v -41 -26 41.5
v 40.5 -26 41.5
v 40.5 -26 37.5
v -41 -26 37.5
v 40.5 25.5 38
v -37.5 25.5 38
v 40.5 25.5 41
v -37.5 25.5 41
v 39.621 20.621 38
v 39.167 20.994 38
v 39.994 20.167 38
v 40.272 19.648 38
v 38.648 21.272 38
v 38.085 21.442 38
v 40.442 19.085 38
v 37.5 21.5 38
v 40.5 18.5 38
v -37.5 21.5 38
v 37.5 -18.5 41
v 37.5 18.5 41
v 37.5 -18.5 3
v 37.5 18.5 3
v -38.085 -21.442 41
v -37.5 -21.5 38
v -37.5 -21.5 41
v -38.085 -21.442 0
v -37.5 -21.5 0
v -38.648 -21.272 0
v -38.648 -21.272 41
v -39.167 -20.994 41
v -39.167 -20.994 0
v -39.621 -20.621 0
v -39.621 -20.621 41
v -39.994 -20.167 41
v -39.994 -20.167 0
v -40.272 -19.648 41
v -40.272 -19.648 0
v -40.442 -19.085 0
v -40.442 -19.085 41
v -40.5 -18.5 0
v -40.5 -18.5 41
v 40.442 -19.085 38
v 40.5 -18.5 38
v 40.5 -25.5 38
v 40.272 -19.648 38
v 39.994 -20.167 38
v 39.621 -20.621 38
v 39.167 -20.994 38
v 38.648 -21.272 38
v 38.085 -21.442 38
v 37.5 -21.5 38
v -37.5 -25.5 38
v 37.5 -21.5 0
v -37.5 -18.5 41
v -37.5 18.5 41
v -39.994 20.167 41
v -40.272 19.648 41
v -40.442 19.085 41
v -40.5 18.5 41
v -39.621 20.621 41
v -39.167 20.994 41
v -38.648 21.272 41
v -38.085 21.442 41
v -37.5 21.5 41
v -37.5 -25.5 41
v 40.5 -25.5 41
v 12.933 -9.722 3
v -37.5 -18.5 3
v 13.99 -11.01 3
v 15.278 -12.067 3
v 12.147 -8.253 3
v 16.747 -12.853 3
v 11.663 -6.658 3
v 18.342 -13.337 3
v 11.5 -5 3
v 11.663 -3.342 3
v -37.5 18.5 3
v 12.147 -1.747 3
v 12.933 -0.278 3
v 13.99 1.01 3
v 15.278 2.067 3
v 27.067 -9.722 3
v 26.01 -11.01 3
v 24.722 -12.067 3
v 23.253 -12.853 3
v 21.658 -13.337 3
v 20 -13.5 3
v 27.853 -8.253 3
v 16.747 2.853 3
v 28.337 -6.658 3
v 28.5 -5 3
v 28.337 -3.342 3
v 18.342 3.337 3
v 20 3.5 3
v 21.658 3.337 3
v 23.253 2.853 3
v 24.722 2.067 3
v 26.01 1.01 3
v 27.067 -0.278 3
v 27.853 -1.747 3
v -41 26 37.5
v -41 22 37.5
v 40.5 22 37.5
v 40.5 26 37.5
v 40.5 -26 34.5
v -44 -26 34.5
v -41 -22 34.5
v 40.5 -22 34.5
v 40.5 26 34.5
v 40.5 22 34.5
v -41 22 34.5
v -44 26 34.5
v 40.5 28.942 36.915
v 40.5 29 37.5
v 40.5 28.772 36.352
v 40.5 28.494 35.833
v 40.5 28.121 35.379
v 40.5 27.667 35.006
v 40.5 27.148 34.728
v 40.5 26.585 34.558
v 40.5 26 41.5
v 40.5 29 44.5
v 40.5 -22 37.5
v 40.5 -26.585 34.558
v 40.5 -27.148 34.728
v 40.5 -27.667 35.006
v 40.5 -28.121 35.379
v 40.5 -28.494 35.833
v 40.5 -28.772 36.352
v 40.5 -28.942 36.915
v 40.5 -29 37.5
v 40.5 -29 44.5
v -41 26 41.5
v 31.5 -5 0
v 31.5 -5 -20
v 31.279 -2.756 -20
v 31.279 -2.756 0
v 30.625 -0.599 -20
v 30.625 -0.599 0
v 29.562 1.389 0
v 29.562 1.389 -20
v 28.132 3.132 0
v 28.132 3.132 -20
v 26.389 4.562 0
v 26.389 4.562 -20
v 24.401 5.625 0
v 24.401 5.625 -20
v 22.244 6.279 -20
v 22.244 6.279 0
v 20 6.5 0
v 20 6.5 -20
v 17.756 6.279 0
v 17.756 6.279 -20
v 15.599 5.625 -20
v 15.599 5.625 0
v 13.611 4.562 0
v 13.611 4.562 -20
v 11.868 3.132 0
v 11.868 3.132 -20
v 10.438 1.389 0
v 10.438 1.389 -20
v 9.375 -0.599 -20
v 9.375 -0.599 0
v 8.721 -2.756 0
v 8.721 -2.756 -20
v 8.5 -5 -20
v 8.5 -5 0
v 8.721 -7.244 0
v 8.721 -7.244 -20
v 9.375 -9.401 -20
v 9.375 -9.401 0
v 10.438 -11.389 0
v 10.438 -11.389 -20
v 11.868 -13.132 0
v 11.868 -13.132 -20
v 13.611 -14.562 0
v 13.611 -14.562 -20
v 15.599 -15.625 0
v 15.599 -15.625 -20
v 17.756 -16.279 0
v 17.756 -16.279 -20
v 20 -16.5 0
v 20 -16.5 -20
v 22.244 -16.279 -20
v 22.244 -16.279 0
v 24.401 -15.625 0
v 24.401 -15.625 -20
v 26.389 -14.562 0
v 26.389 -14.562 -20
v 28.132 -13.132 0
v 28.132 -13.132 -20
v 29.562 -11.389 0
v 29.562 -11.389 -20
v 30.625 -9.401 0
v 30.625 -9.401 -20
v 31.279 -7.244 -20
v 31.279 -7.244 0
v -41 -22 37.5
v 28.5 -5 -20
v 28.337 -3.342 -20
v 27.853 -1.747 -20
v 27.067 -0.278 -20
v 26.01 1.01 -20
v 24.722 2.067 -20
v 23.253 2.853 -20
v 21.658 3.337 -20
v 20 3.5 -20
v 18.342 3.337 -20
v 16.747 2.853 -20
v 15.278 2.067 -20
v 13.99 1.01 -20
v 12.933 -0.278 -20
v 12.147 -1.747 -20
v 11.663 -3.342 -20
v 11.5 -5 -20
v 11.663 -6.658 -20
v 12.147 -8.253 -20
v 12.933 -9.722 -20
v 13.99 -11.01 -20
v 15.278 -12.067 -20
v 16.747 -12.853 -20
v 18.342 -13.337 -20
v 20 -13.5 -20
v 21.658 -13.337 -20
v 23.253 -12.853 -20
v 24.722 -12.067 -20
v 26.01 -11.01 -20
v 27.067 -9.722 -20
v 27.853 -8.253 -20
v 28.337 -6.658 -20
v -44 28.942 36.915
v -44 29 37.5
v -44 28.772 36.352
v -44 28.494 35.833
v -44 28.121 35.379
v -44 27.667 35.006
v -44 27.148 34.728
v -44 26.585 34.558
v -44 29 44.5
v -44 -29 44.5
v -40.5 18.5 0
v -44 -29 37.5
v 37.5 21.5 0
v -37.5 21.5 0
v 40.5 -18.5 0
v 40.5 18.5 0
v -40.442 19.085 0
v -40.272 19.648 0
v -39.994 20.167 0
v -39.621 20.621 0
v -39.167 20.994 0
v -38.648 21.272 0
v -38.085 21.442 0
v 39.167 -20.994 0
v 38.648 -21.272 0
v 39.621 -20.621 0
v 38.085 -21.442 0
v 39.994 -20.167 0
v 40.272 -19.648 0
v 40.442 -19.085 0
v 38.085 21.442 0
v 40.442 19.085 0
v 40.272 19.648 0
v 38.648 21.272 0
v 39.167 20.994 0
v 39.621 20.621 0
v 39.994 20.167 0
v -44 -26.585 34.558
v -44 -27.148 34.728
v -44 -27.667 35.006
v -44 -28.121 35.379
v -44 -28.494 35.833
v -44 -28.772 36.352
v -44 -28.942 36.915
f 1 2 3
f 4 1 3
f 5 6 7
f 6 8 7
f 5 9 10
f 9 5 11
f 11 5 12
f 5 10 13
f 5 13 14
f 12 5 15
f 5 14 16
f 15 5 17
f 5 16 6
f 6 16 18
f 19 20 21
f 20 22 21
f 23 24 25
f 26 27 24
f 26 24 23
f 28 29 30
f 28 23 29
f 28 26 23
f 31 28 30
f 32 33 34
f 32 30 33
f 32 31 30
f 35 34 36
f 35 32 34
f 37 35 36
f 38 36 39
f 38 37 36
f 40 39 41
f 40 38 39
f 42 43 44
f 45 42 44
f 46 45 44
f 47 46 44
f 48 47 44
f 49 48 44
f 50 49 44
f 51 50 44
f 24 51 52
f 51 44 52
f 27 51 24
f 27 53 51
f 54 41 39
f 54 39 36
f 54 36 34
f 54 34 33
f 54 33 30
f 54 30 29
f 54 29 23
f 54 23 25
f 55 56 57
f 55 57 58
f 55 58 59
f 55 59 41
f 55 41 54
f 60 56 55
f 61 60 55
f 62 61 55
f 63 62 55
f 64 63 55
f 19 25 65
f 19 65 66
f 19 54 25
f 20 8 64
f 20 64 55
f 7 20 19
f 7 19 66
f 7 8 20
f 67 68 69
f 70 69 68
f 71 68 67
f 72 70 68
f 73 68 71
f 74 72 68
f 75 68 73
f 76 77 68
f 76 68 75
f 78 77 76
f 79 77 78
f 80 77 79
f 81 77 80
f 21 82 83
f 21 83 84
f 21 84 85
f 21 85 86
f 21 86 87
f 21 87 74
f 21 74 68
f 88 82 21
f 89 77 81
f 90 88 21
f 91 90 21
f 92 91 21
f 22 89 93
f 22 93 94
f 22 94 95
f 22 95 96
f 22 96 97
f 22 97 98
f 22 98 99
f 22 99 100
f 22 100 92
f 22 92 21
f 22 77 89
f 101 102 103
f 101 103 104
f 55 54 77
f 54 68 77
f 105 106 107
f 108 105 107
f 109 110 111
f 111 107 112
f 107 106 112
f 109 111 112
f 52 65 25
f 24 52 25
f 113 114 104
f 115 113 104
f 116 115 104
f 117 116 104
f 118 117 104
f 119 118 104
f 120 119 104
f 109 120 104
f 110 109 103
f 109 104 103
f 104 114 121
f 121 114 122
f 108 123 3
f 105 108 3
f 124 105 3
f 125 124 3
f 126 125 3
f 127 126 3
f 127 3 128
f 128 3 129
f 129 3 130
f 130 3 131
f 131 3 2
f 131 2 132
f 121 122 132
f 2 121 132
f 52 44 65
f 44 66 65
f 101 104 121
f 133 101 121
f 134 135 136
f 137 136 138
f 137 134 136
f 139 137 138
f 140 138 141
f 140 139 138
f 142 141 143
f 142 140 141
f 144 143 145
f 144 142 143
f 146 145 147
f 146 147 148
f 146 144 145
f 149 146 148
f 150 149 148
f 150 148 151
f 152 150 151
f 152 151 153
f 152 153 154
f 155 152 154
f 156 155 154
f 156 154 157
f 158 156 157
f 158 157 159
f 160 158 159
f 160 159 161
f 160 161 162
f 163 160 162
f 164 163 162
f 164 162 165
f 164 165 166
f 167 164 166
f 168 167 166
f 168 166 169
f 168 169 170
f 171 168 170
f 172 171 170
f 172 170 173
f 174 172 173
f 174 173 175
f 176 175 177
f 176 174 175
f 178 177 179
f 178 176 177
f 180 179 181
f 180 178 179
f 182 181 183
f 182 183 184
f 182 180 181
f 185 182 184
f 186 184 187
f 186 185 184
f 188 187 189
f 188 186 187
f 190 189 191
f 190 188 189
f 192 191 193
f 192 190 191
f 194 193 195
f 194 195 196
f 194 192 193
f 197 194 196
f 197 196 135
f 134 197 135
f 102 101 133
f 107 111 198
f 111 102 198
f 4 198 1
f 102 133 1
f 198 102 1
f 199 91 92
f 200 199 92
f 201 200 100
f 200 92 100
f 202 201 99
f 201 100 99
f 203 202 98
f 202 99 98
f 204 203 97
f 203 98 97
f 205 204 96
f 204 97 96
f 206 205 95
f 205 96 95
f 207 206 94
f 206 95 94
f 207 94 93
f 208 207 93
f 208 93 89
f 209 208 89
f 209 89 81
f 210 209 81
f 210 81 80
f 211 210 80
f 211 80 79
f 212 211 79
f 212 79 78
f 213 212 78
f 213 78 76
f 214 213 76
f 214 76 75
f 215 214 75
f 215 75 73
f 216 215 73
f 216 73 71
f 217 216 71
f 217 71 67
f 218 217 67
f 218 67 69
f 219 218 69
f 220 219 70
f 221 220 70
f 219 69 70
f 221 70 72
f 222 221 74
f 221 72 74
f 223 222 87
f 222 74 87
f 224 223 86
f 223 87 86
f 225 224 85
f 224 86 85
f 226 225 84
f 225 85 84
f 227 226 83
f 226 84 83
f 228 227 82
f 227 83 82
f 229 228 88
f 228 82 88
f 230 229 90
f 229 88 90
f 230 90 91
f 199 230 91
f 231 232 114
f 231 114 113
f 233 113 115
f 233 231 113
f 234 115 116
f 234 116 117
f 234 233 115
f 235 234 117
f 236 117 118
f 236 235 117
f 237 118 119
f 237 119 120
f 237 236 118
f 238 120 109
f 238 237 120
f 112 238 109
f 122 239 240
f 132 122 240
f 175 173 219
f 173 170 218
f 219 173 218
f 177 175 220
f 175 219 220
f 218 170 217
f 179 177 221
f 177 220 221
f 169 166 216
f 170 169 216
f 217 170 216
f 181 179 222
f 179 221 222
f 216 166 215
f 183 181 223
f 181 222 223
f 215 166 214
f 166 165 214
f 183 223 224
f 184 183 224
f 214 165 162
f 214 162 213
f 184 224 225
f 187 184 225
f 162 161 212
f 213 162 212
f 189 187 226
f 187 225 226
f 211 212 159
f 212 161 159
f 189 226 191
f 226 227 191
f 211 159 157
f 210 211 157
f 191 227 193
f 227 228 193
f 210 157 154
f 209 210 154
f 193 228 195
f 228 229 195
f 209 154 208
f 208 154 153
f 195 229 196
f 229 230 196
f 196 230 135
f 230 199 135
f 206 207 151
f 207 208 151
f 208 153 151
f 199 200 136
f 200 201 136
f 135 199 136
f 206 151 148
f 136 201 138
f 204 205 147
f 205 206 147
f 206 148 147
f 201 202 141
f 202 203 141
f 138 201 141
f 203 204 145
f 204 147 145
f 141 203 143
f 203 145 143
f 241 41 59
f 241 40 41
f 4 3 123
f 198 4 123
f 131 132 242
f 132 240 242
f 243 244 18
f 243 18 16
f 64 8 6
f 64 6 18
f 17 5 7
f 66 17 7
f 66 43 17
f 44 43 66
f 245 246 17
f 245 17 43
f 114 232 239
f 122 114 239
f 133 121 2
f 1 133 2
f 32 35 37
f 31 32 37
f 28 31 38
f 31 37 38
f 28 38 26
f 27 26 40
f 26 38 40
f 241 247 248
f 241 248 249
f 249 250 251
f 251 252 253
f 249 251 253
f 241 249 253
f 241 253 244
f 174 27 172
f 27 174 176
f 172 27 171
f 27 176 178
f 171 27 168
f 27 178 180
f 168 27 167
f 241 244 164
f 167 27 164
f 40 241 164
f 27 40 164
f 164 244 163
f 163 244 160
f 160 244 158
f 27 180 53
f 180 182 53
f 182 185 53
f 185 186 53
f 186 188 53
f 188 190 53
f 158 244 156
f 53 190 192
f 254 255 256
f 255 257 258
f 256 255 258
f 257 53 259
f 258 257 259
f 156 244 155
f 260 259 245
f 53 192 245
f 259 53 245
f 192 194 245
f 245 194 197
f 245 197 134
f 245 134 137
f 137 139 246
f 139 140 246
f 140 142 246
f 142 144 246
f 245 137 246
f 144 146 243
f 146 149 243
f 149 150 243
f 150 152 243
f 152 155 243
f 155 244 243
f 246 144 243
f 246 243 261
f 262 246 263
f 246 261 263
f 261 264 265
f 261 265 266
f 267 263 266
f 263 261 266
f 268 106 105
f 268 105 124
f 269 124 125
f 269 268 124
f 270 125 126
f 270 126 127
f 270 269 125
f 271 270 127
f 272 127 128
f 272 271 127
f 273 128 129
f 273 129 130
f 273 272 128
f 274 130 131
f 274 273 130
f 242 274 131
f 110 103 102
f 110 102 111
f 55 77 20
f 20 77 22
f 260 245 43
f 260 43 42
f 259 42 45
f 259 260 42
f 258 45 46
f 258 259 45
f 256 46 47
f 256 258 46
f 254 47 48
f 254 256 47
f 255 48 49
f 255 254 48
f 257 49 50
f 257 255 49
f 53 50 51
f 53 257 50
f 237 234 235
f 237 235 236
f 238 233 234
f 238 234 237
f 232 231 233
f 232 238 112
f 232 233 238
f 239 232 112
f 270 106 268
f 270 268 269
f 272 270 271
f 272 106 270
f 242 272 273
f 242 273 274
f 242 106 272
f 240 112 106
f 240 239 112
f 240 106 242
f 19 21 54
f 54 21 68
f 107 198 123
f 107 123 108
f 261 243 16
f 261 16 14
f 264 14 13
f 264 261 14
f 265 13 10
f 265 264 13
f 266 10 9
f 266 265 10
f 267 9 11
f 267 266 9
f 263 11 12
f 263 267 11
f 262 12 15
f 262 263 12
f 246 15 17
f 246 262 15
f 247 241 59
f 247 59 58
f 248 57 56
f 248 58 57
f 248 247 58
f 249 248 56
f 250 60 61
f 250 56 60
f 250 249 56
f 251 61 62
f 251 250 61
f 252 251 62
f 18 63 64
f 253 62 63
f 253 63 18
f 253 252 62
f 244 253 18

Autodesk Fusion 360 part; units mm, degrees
sketch "Sketch1" plane through (0, 0, 0) normal (0, 0, 1) x (1, 0, 0)
  line L0 (37.5, -18.5) -> (-37.5, -18.5)
  line L1 (-37.5, -18.5) -> (-37.5, 18.5)
  line L2 (-37.5, 18.5) -> (37.5, 18.5)
  line L3 (37.5, 18.5) -> (37.5, -18.5)
  line L4 (37.5, -18.5) -> (-37.5, 18.5) construction
  line L5 (-37.5, -18.5) -> (37.5, 18.5) construction
  line L6 (-37.5, 21.5) -> (37.5, 21.5)
  line L7 (40.5, 18.5) -> (40.5, -18.5)
  line L8 (37.5, -21.5) -> (-37.5, -21.5)
  line L9 (-40.5, -18.5) -> (-40.5, 18.5)
  arc A0 (-37.5, 21.5) -> (-40.5, 18.5) centre (-37.5, 18.5) ccw
  arc A1 (40.5, 18.5) -> (37.5, 21.5) centre (37.5, 18.5) ccw
  arc A2 (37.5, -21.5) -> (40.5, -18.5) centre (37.5, -18.5) ccw
  arc A3 (-40.5, -18.5) -> (-37.5, -21.5) centre (-37.5, -18.5) ccw
  circle A4 centre (20, -5) radius 8.5
  circle A5 centre (20, -5) radius 11.5
  dimension "d1" = 75
  dimension "d2" = 37
  dimension "d4" = 3
  dimension "d5" = 3
  dimension "d6" = 3
  dimension "d7" = 3
  dimension "d10" = 17
  dimension "d11" = 23
extrude "Extrude2" add sketch "Sketch1" against normal blind 20 contours A5 makes body 1
extrude "Extrude1" add sketch "Sketch1" along normal blind 3 separate body contours L0 L1 L2 L3 | L6 L7 L8 L9 A0 A1 A2 A3 | A4 | A5 makes body 2
extrude "Extrude3" cut sketch "Sketch1" along normal blind 11 contours A4 bodies 2
extrude "Extrude4" add sketch "Sketch1" along normal blind 41 contours L6 L7 L8 L9 A0 A1 A2 A3 bodies 2
sketch "Sketch2" plane through (0, 0, 41) normal (0, 0, 1) x (-1, 0, 0)
  line L0 (37.5, -18.5) -> (-37.5, -18.5)
  line L1 (-37.5, -18.5) -> (-37.5, 18.5)
  line L2 (-37.5, 18.5) -> (37.5, 18.5)
  line L3 (37.5, 18.5) -> (37.5, -18.5)
  arc A0 (37.5, -21.5) -> (40.5, -18.5) centre (37.5, -18.5) ccw
  line L4 (40.5, -18.5) -> (40.5, 18.5)
  arc A1 (40.5, 18.5) -> (37.5, 21.5) centre (37.5, 18.5) ccw
  line L5 (37.5, 21.5) -> (-37.5, 21.5)
  arc A2 (-37.5, 21.5) -> (-40.5, 18.5) centre (-37.5, 18.5) ccw
  line L6 (-40.5, 18.5) -> (-40.5, -18.5)
  arc A3 (-40.5, -18.5) -> (-37.5, -21.5) centre (-37.5, -18.5) ccw
  line L7 (-37.5, -21.5) -> (37.5, -21.5)
  line L8 (37.5, -18.5) -> (-37.5, -18.5)
  line L9 (-37.5, -18.5) -> (-37.5, 18.5)
  line L10 (-37.5, 18.5) -> (37.5, 18.5)
  line L11 (37.5, 18.5) -> (37.5, -18.5)
  line L12 (37.5, -18.5) -> (-37.5, 18.5) construction
  line L13 (-37.5, -18.5) -> (37.5, 18.5) construction
  line L14 (37.5, -21.5) -> (-37.5, -21.5)
  line L15 (-40.5, -18.5) -> (-40.5, 18.5)
  line L16 (-37.5, 21.5) -> (37.5, 21.5)
  line L17 (40.5, 18.5) -> (40.5, -18.5)
  arc A4 (37.5, -21.5) -> (40.5, -18.5) centre (37.5, -18.5) ccw
  arc A5 (40.5, 18.5) -> (37.5, 21.5) centre (37.5, 18.5) ccw
  arc A6 (-40.5, -18.5) -> (-37.5, -21.5) centre (-37.5, -18.5) ccw
  arc A7 (-37.5, 21.5) -> (-40.5, 18.5) centre (-37.5, 18.5) ccw
  line L18 (37.5, -21.5) -> (-37.5, -21.5)
  line L19 (-37.5, -21.5) -> (-37.5, -25.5)
  line L20 (-37.5, -25.5) -> (37.5, -25.5)
  line L21 (37.5, -25.5) -> (37.5, -21.5)
  line L22 (37.5, 21.5) -> (-37.5, 21.5)
  line L23 (-37.5, 21.5) -> (-37.5, 25.5)
  line L24 (-37.5, 25.5) -> (37.5, 25.5)
  line L25 (37.5, 25.5) -> (37.5, 21.5)
  line L26 (-37.5, -25.5) -> (-40.5, -25.5)
  line L27 (-40.5, -25.5) -> (-40.5, 25.5)
  line L28 (-40.5, 25.5) -> (-37.5, 25.5)
  line L29 (-37.5, 25.5) -> (-37.5, -25.5)
  dimension "d19" = 3
  dimension "d20" = 3
  dimension "d21" = 3
  dimension "d22" = 3
  dimension "d23" = 4
  dimension "d24" = 4
extrude "Extrude6" add sketch "Sketch2" against normal blind 3 contours L1 A2 L6 A3 L9 L15 A6 A7 L27 L29 | A3 A6 L19 L26 L27 L29 | A2 A7 L23 L27 L28 L29 bodies 2
extrude "Extrude5" add sketch "Sketch2" against normal blind 3 contours L7 L14 L18 L19 L20 L21 L29 | L5 L16 L22 L23 L24 L25 L29 bodies 2
sketch "Sketch3" plane through (-40.5, 0, 0) normal (-1, 0, 0) x (0, -1, 0)
  line L0 (-18.5, 0) -> (18.5, 0)
  line L1 (18.5, 0) -> (18.5, 41)
  line L2 (18.5, 41) -> (-18.5, 41)
  line L3 (-18.5, 41) -> (-18.5, 0)
  line L4 (25.5, 38) -> (-25.5, 38)
  line L5 (-25.5, 38) -> (-25.5, 41)
  line L6 (-25.5, 41) -> (25.5, 41)
  line L7 (25.5, 41) -> (25.5, 38)
  line L8 (25.5, 38) -> (-25.5, 41) construction
  line L9 (-25.5, 38) -> (25.5, 41) construction
  line L10 (-26, 41.5) -> (26, 41.5)
  line L11 (26, 41.5) -> (26, 37.5)
  line L12 (26, 37.5) -> (-26, 37.5)
  line L13 (-26, 37.5) -> (-26, 41.5)
  line L14 (-29, 44.5) -> (29, 44.5)
  line L15 (29, 44.5) -> (29, 37.5)
  line L16 (26, 34.5) -> (-26, 34.5)
  line L17 (-29, 37.5) -> (-29, 44.5)
  line L18 (-22, 38) -> (-22, 34.5)
  line L19 (22, 38) -> (22, 34.5)
  arc A0 (-29, 37.5) -> (-26, 34.5) centre (-26, 37.5) ccw
  arc A1 (26, 34.5) -> (29, 37.5) centre (26, 37.5) ccw
  point P0 (0, 39.5)
  dimension "d29" = 51
  dimension "d30" = 3
  dimension "d31" = -0.5
  dimension "d33" = 3
  dimension "d34" = 3
extrude "Extrude7" add sketch "Sketch3" against normal blind 81 separate body contours L10 L11 L12 L13 L14 L15 L16 L17 L18 L19 A0 A1 makes body 3
extrude "Extrude8" add sketch "Sketch3" along normal blind 3.5 contours L10 L11 L12 L13 L14 L15 L16 L17 L18 L19 A0 A1 bodies 3
extrude "Extrude9" add sketch "Sketch3" along normal blind 3.5 contours L3 L12 L16 L18 | L1 L3 L12 L16 | L1 L12 L16 L19 | L3 L4 L12 L18 | L1 L3 L4 L12 | L10 L11 L12 L13 L14 L15 L16 L17 L18 L19 A0 A1 | L1 L4 L12 L19 | L3 L4 L5 L6 | L1 L2 L3 L4 L6 | L2 L4 L5 L6 L7 L10 L11 L12 L13 L18 L19 | L1 L4 L6 L7 bodies 3
extrude "Extrude10" cut sketch "Sketch3" along normal blind 0.5 contours L3 L12 L16 L18 | L1 L3 L12 L16 | L1 L12 L16 L19 | L3 L4 L12 L18 | L1 L3 L4 L12 | L1 L4 L12 L19 | L3 L4 L5 L6 | L1 L2 L3 L4 L6 | L2 L4 L5 L6 L7 L10 L11 L12 L13 L18 L19 | L1 L4 L6 L7 bodies 3
combine "Combine1" operation add target body 2 tool bodies 1
